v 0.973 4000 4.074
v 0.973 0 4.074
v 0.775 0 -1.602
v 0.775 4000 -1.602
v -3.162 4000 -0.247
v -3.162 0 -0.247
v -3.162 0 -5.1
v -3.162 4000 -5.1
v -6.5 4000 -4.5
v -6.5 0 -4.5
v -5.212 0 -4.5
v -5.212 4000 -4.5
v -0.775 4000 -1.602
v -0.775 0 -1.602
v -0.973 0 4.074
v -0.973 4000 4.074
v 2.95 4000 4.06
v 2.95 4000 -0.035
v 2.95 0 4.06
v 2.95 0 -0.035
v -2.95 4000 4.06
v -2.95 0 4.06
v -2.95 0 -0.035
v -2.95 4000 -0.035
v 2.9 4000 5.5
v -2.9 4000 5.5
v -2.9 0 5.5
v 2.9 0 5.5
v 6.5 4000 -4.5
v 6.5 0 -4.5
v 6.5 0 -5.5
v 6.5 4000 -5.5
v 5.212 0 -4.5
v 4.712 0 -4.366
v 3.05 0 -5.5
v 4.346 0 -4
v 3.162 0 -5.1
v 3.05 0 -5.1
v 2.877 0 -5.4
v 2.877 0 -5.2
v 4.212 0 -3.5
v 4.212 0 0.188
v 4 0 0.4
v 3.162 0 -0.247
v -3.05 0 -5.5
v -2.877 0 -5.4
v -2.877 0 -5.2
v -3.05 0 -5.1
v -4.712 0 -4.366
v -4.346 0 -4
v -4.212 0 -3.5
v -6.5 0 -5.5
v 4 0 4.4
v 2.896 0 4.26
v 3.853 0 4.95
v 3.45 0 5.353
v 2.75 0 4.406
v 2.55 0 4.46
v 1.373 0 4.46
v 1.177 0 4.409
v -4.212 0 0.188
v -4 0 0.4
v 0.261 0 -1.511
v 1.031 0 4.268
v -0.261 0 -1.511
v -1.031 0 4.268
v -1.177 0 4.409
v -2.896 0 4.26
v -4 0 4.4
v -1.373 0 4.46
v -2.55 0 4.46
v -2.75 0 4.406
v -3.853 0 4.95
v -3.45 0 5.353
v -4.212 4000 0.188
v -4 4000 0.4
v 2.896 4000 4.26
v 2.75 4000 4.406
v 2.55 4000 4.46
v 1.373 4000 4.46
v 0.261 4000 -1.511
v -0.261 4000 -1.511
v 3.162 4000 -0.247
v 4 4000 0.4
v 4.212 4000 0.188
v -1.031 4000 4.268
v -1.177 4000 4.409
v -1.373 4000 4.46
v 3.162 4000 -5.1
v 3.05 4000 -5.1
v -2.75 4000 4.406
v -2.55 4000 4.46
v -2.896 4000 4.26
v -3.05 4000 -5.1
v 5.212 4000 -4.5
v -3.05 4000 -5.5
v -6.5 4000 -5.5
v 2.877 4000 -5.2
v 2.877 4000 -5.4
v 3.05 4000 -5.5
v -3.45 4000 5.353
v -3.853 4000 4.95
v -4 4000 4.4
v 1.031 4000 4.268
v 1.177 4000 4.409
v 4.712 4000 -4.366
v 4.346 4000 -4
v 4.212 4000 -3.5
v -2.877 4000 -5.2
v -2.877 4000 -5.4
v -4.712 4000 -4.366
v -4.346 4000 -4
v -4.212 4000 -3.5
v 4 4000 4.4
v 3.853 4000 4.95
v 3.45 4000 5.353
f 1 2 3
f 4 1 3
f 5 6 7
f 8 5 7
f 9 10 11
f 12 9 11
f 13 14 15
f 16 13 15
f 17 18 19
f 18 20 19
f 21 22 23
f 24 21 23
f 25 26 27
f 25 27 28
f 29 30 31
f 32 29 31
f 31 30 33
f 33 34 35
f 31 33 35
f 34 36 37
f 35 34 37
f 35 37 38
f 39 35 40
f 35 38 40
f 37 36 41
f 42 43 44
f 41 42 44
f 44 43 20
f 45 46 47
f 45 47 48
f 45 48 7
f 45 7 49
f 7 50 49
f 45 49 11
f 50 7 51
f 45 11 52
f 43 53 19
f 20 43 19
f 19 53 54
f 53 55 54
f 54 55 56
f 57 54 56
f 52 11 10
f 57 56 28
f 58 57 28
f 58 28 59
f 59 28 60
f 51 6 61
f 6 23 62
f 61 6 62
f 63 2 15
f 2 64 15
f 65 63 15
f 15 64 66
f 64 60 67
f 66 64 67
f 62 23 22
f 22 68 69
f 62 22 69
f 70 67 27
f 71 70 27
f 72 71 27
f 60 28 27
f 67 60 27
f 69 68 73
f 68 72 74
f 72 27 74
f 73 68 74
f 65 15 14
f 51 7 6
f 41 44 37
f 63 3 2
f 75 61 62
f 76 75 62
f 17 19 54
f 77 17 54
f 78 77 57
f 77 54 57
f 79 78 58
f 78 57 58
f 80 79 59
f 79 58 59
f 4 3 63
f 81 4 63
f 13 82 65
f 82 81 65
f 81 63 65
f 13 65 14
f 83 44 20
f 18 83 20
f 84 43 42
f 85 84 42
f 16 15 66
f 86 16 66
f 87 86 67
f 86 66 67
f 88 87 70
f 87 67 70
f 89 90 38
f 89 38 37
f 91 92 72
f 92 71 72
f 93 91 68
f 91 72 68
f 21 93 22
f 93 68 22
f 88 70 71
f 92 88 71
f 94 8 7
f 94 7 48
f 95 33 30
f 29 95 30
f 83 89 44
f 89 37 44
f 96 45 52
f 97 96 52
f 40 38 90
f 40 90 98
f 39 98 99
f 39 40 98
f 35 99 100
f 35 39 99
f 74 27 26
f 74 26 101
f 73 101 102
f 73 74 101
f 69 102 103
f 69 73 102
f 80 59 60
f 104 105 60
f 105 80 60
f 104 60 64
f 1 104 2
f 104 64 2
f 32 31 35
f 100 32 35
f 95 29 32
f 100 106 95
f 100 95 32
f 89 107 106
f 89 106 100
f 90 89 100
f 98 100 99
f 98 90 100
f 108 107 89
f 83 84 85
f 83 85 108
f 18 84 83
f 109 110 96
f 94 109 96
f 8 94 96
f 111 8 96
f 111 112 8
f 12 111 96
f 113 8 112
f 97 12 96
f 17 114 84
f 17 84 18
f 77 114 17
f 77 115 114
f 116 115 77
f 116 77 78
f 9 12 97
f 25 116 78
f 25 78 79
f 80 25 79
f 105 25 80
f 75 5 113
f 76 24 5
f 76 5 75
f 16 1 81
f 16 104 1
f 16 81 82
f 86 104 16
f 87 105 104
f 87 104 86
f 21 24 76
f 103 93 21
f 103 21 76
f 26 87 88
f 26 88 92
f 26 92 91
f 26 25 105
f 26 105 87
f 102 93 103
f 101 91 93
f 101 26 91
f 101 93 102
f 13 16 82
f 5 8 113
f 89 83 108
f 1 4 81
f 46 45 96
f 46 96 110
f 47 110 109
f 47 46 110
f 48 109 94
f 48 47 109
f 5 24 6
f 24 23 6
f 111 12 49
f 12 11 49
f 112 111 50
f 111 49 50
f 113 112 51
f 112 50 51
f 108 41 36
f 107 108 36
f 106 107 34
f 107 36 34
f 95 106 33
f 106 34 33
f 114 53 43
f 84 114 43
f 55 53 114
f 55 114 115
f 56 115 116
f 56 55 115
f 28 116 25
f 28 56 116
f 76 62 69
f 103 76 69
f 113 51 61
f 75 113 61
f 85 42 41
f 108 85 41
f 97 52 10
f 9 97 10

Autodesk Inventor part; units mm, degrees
ref_plane "YZ Plane" through (0, 0, 0) normal (1, 0, 0) x (0, 1, 0)
ref_plane "Start Plane" through (0, 0, 0) normal (0, 1, 0) x (-1, 0, 0)
ref_plane "End Plane" through (0, 100, 0) normal (0, 1, 0) x (-1, 0, 0)
sketch "Sketch1" plane through (0, 0, 0) normal (0, 1, 0) x (-1, 0, 0)
  arc A0 (-3.05, -5.5) -> (-3.05, -5.1) centre (-3.05, -5.3) ccw
  line L0 (-3.05, -5.1) -> (-3.1625, -5.1)
  line L1 (-3.1625, -5.1) -> (-3.1625, -0.2474)
  line L2 (-3.1625, -0.2474) -> (-2.95, -0.0349)
  line L3 (-2.95, -0.0349) -> (-2.95, 4.06)
  arc A1 (-2.55, 4.46) -> (-2.95, 4.06) centre (-2.55, 4.06) ccw
  line L4 (-2.55, 4.46) -> (-1.373, 4.46)
  arc A2 (-0.9732, 4.074) -> (-1.373, 4.46) centre (-1.373, 4.06) ccw
  line L5 (-0.9732, 4.074) -> (-0.775, -1.6018)
  arc A3 (0.775, -1.6018) -> (-0.775, -1.6018) centre (0, -4.5) ccw
  line L6 (0.775, -1.6018) -> (0.9732, 4.074)
  arc A4 (1.373, 4.46) -> (0.9732, 4.074) centre (1.373, 4.06) ccw
  line L7 (1.373, 4.46) -> (2.55, 4.46)
  arc A5 (2.95, 4.06) -> (2.55, 4.46) centre (2.55, 4.06) ccw
  line L8 (2.95, 4.06) -> (2.95, -0.0349)
  line L9 (2.95, -0.0349) -> (3.1625, -0.2474)
  line L10 (3.1625, -0.2474) -> (3.1625, -5.1)
  line L11 (3.1625, -5.1) -> (3.05, -5.1)
  arc A6 (3.05, -5.1) -> (3.05, -5.5) centre (3.05, -5.3) ccw
  line L12 (3.05, -5.5) -> (6.5, -5.5)
  line L13 (6.5, -5.5) -> (6.5, -4.5)
  line L14 (6.5, -4.5) -> (5.2125, -4.5)
  arc A7 (4.2125, -3.5) -> (5.2125, -4.5) centre (5.2125, -3.5) ccw
  line L15 (4.2125, -3.5) -> (4.2125, 0.1875)
  line L16 (4.2125, 0.1875) -> (4, 0.4)
  line L17 (4, 0.4) -> (4, 4.4)
  arc A8 (4, 4.4) -> (2.9, 5.5) centre (2.9, 4.4) ccw
  line L18 (2.9, 5.5) -> (-2.9, 5.5)
  arc A9 (-2.9, 5.5) -> (-4, 4.4) centre (-2.9, 4.4) ccw
  line L19 (-4, 4.4) -> (-4, 0.4)
  line L20 (-4, 0.4) -> (-4.2125, 0.1875)
  line L21 (-4.2125, 0.1875) -> (-4.2125, -3.5)
  arc A10 (-5.2125, -4.5) -> (-4.2125, -3.5) centre (-5.2125, -3.5) ccw
  line L22 (-5.2125, -4.5) -> (-6.5, -4.5)
  line L23 (-6.5, -4.5) -> (-6.5, -5.5)
  line L24 (-6.5, -5.5) -> (-3.05, -5.5)
  point P0 (0, 0)
extrude "Body" add sketch "Sketch1" along normal blind 4000 from surface at 0
sketch "Sketch2" plane through (0, 0, 0) normal (0, 1, 0) x (-1, 0, 0)
  line L0 (0, 0) -> (10, 0)
ref_plane "Work Plane3" through (0, 0, 0) normal (0, 0, -1) x (-1, 0, 0)
sketch "Sketch3" plane through (0, 0, 0) normal (0, 0, -1) x (-1, 0, 0)
  line L0 (-2, 0) -> (12, 0)
  line L1 (-2, 100) -> (12, 100)
  dimension "d7" = 100
equation "\"G_OFFSET_START\" = 0"
equation "\"G_OFFSET_END\" = 0"
equation "\"G_L\" = d7"
properties part number "13-106"
